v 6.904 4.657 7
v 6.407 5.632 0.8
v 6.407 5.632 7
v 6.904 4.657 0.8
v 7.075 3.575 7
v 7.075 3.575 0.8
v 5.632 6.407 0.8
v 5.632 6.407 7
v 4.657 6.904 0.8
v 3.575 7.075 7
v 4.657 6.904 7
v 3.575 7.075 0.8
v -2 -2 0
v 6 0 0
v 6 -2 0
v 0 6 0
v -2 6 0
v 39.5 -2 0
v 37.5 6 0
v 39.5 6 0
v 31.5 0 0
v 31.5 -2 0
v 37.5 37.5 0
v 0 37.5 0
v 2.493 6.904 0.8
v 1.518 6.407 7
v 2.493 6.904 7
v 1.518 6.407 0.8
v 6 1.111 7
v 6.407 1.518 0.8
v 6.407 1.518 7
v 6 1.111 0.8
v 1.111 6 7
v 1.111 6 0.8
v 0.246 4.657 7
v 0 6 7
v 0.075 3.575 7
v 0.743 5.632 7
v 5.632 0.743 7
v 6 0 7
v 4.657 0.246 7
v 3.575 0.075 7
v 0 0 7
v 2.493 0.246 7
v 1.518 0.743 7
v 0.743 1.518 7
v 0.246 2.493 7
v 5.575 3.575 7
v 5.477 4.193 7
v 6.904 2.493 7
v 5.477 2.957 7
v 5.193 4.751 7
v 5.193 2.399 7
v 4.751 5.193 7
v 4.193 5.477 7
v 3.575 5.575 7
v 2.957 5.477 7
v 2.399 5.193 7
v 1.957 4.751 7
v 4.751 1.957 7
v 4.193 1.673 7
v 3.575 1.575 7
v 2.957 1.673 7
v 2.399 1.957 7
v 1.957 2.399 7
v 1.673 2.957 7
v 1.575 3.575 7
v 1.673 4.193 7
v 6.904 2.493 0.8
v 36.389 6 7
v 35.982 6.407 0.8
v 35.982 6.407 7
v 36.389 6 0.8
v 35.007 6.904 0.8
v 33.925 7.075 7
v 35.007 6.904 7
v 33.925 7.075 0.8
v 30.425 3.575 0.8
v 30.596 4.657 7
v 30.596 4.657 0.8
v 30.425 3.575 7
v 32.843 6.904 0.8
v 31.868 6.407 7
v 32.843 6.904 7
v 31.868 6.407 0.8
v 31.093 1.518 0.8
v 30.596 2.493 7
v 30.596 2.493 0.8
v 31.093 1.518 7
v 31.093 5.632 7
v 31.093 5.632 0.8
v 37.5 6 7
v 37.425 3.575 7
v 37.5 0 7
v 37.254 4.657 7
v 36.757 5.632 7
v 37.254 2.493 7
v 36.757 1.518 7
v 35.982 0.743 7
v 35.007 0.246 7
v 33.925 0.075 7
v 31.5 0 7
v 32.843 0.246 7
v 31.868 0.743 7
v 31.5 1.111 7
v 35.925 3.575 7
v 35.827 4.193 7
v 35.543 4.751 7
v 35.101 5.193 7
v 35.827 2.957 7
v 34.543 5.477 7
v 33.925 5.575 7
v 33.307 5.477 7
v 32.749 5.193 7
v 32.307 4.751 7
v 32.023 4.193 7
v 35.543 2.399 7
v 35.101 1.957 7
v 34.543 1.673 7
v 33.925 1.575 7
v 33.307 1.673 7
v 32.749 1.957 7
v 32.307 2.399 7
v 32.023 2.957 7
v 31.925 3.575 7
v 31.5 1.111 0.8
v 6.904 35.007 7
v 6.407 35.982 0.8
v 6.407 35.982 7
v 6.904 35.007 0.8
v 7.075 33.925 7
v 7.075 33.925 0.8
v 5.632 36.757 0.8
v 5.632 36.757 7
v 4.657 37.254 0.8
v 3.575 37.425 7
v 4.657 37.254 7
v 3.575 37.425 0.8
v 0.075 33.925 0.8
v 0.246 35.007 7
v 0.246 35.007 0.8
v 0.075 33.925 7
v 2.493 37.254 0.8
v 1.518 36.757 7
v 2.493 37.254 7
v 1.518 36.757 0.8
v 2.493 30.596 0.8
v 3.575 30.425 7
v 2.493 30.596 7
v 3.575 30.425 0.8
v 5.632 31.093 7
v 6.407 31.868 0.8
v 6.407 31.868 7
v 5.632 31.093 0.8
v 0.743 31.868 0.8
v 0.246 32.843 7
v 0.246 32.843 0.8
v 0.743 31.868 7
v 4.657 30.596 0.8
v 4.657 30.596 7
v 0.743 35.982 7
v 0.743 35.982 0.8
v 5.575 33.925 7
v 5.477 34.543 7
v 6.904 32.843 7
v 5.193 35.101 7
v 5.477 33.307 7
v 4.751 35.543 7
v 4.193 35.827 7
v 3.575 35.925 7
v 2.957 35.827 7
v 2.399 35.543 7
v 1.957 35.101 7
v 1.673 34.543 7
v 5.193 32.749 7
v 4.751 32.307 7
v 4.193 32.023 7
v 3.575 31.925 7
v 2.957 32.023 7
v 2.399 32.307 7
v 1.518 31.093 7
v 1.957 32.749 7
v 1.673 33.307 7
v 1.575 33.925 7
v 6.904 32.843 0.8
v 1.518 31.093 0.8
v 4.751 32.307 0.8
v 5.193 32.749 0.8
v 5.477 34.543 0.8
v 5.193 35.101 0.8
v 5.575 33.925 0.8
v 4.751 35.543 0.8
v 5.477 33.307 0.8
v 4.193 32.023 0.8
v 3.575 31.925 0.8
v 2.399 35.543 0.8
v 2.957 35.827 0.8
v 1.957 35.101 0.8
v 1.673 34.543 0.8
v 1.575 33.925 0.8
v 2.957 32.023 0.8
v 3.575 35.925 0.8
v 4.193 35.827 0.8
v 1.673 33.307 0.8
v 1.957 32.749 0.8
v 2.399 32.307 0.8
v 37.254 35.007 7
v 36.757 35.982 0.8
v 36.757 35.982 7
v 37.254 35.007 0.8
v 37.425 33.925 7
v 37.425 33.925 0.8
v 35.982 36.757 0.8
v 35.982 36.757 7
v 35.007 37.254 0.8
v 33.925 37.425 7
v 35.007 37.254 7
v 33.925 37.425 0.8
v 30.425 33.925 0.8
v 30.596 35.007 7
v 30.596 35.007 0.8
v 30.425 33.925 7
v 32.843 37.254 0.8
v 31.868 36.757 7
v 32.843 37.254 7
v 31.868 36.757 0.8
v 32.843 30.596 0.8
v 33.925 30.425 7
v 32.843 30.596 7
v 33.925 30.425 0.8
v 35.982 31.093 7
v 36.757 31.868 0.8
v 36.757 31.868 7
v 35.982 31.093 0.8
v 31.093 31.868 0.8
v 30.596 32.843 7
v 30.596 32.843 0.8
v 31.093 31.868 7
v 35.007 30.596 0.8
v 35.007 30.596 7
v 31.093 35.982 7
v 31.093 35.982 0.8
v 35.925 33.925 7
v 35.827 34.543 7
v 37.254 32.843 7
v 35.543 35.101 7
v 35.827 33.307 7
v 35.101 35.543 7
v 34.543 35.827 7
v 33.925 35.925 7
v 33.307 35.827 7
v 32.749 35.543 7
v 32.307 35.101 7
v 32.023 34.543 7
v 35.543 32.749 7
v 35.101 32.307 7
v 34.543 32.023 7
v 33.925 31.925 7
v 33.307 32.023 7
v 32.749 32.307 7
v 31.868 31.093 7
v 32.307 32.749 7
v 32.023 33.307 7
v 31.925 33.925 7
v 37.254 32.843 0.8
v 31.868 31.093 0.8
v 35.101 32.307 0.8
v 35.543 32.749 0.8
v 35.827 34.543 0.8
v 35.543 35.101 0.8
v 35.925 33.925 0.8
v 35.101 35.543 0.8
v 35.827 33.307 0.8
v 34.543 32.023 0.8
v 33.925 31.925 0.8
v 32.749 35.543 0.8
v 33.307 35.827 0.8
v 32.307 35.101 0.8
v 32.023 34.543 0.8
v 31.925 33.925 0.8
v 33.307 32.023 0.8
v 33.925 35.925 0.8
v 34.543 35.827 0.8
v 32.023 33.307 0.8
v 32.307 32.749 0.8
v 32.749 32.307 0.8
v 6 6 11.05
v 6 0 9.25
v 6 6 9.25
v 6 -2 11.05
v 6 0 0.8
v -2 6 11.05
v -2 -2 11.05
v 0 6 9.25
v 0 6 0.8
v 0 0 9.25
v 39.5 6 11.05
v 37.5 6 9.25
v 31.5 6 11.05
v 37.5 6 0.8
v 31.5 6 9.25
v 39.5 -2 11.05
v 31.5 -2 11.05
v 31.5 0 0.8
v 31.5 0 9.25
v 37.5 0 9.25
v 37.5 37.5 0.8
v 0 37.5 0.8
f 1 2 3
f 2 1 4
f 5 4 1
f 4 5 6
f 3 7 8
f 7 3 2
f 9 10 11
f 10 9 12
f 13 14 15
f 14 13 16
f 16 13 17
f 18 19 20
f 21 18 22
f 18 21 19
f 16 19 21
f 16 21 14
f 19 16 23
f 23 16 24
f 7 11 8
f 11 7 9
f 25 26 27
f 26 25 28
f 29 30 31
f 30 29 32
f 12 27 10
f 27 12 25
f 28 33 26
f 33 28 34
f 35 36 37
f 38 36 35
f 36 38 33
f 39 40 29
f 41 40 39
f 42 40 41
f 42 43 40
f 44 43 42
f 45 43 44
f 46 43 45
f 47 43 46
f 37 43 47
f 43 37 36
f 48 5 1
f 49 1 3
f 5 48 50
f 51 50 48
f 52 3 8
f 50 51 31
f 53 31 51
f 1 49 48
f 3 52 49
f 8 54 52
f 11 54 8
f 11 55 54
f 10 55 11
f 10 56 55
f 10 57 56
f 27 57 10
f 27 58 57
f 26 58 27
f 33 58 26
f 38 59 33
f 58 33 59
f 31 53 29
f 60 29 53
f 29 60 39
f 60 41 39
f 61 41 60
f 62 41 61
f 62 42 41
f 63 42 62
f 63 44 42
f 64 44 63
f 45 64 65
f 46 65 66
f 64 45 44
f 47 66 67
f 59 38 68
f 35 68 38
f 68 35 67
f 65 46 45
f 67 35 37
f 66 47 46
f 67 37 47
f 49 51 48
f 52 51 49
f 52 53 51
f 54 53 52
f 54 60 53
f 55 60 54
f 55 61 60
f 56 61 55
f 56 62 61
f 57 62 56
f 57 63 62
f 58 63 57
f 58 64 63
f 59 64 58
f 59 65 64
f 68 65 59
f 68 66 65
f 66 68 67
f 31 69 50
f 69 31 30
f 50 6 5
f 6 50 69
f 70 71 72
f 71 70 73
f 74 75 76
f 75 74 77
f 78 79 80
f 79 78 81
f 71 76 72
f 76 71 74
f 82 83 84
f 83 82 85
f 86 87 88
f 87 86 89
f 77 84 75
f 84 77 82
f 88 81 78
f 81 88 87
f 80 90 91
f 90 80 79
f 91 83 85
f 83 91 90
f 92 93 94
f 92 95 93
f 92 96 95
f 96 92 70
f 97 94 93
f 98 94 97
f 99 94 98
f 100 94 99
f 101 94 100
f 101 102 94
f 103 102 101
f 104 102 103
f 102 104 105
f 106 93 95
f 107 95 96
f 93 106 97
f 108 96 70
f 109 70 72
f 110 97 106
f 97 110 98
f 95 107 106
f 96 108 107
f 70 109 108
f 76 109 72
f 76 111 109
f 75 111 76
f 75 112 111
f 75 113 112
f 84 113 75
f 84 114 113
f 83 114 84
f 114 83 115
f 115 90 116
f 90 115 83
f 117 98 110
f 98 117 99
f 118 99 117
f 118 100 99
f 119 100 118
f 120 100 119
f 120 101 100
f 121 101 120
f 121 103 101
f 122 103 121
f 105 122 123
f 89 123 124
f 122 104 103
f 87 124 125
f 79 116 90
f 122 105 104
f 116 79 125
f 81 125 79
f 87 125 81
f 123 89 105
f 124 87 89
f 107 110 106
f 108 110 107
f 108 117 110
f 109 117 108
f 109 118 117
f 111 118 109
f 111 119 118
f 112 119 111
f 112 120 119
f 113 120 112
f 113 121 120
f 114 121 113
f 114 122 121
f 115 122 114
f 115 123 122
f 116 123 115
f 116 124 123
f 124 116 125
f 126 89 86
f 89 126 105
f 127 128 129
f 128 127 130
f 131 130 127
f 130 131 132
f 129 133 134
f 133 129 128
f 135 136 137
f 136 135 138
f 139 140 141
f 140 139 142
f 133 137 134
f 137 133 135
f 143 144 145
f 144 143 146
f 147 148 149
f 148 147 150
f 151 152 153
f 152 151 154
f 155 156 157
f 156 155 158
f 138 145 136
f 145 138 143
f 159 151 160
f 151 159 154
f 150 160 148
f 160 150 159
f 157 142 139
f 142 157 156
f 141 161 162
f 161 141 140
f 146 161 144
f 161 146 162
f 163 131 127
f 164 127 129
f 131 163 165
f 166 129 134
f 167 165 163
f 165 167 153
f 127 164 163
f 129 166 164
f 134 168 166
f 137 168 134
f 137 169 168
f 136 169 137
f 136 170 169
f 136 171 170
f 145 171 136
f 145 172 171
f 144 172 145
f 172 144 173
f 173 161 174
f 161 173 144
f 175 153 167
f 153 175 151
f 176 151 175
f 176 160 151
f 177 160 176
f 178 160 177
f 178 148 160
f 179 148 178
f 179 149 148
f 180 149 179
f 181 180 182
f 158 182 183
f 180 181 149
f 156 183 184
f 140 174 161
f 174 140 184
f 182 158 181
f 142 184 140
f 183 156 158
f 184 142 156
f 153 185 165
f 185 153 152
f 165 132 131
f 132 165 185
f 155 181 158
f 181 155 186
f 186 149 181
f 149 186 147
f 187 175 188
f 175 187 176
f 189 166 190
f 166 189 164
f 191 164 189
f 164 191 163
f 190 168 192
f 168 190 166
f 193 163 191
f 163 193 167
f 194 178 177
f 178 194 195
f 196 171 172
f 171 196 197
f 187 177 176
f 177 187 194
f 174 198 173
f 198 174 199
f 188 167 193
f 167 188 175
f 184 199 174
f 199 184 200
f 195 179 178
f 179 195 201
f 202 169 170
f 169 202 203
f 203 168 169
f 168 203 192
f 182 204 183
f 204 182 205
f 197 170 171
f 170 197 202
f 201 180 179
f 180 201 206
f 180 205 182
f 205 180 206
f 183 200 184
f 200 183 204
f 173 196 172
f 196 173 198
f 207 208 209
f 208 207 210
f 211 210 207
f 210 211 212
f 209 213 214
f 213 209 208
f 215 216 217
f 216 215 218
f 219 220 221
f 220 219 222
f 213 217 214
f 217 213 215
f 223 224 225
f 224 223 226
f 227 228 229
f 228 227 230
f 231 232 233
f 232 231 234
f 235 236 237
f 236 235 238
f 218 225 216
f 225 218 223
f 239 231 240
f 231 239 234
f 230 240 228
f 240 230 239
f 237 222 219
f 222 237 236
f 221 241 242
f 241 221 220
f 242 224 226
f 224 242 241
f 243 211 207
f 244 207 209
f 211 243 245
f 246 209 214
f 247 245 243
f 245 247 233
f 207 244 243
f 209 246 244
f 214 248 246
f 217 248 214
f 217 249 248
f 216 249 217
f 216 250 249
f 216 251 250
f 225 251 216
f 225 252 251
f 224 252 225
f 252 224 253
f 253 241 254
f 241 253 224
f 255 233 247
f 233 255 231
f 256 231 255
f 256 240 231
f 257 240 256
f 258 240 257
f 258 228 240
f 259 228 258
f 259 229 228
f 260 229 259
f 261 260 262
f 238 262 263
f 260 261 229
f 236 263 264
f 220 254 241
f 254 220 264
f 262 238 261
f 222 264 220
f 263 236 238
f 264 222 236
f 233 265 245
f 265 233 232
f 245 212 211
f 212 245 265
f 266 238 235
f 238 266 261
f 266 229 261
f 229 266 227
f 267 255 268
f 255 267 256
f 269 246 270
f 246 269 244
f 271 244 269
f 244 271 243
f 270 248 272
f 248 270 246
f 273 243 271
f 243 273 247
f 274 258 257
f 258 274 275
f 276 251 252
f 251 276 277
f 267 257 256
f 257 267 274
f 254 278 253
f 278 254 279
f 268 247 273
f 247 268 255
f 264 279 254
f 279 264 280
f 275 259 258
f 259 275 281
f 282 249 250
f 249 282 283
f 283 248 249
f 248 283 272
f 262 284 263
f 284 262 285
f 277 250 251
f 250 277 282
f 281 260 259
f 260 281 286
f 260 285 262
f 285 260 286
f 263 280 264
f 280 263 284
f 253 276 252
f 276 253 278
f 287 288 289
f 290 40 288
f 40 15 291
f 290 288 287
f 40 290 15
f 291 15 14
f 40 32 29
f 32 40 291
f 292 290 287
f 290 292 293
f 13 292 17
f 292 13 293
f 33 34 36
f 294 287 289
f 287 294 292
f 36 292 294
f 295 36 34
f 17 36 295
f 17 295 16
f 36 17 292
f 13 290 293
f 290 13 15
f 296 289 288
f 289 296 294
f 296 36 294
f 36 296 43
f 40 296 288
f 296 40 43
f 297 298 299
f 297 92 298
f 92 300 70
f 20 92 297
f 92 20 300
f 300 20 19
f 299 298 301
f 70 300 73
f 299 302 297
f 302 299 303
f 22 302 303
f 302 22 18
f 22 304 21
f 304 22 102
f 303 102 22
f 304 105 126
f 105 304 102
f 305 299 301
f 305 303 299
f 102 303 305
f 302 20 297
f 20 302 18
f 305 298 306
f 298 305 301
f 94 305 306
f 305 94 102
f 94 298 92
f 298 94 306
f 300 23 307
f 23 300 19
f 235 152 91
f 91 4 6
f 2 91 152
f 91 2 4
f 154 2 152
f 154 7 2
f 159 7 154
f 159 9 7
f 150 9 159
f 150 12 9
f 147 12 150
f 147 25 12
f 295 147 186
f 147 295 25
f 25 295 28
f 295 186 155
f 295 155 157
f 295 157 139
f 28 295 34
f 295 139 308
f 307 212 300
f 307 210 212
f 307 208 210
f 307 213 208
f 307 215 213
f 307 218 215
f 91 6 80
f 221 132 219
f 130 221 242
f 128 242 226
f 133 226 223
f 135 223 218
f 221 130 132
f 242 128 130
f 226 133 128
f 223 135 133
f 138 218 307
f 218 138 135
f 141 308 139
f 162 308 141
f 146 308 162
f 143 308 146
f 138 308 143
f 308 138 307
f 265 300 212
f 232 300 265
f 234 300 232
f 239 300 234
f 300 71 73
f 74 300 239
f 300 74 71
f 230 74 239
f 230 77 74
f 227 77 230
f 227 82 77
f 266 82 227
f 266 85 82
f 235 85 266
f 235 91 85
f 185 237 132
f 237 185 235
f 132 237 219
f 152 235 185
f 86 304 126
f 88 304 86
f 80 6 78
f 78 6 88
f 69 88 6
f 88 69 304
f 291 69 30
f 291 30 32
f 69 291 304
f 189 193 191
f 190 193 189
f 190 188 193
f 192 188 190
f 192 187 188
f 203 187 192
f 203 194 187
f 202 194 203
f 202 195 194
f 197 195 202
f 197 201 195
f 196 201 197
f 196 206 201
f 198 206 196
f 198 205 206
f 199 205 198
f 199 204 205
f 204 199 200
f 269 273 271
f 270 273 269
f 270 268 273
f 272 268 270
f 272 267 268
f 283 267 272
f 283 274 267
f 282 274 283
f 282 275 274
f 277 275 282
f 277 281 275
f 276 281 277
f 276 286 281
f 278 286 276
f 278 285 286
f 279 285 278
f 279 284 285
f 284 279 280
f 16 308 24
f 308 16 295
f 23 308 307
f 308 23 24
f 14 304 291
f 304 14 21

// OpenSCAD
$fn = 20;

hole_distance = 30.35;
base_size = 37.5;
distance_to_edge = (base_size-hole_distance) / 2;
spacer_height=7;
breadboard_height=1.75;
tolerance=0.5;

cube([base_size, base_size, 0.8]);
for (i=[0:1]) {
    for (j=[0:1]){
        translate([
            distance_to_edge + hole_distance*j,
            distance_to_edge + hole_distance*i,0])
            difference() {
                cylinder(spacer_height, 3.5, 3.5);
                cylinder(spacer_height, 2, 2);
            }
    }
}

module breadboard_clamp(){
    difference() {
        cube([8, 8, spacer_height+breadboard_height+tolerance+1.8]);
        translate([2, 2, spacer_height]) cube([6, 6, breadboard_height+tolerance]);
    }    
}

translate([-2, -2, 0]) breadboard_clamp();
translate([base_size+2, -2, 0]) rotate([0, 0, 90]) breadboard_clamp();
